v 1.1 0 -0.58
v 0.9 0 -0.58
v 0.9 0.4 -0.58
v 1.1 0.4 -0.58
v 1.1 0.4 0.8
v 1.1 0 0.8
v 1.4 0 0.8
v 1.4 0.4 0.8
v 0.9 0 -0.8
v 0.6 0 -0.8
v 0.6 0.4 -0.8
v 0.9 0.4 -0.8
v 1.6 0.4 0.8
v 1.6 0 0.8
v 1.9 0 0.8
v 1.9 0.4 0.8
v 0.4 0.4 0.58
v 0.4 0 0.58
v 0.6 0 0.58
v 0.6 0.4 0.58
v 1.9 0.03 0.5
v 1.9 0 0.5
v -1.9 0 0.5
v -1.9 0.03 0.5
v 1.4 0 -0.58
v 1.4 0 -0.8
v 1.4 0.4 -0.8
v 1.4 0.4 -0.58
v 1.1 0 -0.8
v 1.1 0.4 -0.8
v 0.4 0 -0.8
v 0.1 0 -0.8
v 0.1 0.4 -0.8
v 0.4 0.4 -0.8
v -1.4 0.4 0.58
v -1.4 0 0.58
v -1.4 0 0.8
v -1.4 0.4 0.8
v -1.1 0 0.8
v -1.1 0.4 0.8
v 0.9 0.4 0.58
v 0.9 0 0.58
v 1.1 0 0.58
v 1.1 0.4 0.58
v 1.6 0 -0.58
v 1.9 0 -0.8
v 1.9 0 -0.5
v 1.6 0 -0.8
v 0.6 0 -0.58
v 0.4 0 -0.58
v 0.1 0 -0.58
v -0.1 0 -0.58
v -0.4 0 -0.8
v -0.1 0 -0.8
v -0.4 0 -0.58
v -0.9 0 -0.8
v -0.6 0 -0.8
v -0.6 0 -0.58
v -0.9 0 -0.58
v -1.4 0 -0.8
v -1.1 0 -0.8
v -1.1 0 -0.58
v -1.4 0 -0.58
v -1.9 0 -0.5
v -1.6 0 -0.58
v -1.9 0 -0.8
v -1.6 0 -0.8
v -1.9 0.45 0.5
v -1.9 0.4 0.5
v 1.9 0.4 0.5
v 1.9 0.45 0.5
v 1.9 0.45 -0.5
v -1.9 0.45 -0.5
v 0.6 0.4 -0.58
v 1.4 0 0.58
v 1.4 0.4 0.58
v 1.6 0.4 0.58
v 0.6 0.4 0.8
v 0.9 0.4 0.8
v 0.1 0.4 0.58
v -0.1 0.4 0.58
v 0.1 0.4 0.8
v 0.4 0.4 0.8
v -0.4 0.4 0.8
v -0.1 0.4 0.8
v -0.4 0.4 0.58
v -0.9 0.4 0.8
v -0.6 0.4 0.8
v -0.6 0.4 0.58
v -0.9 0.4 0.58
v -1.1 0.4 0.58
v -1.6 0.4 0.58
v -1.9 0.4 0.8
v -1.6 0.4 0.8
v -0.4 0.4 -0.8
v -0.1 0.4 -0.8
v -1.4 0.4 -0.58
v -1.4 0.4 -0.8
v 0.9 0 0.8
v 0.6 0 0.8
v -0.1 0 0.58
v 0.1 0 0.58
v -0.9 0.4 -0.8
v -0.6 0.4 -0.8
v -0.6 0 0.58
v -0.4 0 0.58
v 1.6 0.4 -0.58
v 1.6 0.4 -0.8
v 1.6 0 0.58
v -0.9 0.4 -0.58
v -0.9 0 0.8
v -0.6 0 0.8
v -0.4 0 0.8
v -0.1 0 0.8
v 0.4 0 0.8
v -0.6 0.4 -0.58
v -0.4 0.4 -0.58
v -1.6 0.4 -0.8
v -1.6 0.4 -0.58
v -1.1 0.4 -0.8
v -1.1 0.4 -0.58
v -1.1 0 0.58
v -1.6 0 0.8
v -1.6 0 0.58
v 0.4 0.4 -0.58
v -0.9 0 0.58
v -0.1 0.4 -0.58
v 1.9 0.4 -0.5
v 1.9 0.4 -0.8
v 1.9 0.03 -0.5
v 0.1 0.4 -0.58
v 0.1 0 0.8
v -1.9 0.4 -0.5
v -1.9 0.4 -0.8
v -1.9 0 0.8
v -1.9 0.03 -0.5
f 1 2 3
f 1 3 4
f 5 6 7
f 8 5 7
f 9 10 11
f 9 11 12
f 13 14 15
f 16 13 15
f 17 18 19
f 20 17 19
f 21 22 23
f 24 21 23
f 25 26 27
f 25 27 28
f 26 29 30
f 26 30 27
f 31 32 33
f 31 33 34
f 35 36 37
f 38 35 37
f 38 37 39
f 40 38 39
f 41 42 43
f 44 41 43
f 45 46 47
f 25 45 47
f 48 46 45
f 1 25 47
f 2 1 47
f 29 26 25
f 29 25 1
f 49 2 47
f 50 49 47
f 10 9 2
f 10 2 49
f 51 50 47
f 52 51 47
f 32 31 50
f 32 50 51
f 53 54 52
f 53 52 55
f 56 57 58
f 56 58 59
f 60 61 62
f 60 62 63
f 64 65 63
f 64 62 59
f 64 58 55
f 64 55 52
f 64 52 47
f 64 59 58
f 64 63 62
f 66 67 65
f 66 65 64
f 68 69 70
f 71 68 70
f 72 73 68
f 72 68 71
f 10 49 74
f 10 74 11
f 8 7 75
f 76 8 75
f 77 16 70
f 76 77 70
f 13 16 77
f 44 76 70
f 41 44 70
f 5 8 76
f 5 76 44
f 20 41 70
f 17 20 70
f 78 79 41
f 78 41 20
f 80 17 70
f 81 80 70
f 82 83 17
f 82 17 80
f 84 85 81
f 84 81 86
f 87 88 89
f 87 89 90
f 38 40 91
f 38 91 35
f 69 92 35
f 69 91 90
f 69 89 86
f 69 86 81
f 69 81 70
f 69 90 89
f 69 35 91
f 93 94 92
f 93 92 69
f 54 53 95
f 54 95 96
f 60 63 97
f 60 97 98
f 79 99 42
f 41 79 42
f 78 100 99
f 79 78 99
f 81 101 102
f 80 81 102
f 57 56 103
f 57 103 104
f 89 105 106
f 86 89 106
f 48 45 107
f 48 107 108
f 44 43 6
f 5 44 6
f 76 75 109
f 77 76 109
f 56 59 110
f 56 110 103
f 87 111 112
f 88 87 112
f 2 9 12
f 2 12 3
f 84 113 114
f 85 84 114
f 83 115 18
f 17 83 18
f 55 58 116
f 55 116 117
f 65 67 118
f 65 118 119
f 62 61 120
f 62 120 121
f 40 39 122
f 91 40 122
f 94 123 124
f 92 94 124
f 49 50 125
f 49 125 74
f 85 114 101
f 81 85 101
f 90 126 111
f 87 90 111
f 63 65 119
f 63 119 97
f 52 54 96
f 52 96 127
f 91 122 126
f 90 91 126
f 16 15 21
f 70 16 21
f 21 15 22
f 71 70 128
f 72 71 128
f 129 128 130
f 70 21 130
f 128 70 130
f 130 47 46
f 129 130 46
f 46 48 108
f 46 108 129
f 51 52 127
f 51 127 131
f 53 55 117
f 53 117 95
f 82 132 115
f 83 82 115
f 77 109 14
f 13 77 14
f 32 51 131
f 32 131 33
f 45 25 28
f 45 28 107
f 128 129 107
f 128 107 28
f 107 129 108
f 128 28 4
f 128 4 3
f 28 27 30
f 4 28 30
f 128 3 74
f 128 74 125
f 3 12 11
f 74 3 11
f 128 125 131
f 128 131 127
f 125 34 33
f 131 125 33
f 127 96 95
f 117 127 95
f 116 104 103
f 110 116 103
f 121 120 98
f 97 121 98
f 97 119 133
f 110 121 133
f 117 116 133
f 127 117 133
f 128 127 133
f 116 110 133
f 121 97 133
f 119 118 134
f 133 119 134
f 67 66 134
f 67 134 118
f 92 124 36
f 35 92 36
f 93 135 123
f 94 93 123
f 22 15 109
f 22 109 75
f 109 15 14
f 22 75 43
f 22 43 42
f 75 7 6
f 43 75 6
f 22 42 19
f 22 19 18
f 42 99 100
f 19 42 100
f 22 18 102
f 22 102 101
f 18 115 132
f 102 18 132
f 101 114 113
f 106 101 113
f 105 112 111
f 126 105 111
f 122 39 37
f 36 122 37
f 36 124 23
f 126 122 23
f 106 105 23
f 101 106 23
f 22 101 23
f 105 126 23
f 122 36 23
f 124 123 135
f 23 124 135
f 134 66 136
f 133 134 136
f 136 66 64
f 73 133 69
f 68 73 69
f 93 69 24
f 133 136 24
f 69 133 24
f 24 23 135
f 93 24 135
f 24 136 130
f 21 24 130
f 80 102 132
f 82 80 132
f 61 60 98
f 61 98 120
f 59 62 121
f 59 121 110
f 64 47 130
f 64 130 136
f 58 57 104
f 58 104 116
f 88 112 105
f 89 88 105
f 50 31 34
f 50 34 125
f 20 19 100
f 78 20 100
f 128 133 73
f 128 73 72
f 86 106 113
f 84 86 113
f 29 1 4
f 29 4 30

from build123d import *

# Parameters (mm, degrees)
BOSS_EXTRUDE1_START = 0.03
SKETCH1_W           = 3.8
SKETCH1_H           = 1
BOSS_EXTRUDE1_DEPTH = 0.42
BOSS_EXTRUDE2_DEPTH = 0.4


with BuildPart() as part:
    # Sketch1 → Boss-Extrude1 (new body)
    with BuildSketch(Plane(origin=(0, 0, 0), x_dir=(1, 0, 0), z_dir=(0, 1, 0)).offset(BOSS_EXTRUDE1_START)):
        Rectangle(SKETCH1_W, SKETCH1_H)
    extrude(amount=BOSS_EXTRUDE1_DEPTH)

    # Sketch2 → Boss-Extrude2 (add)
    with BuildSketch(Plane(origin=(0, 0, 0), x_dir=(1, 0, 0), z_dir=(0, 1, 0))):
        Polygon((1.9, 0.5), (-1.9, 0.5), (-1.9, 0.8), (-1.6, 0.8), (-1.6, 0.58), (-1.4, 0.58), (-1.4, 0.8), (-1.1, 0.8), (-1.1, 0.58), (-0.9, 0.58), (-0.9, 0.8), (-0.6, 0.8), (-0.6, 0.58), (-0.4, 0.58), (-0.4, 0.8), (-0.1, 0.8), (-0.1, 0.58), (0.1, 0.58), (0.1, 0.8), (0.4, 0.8), (0.4, 0.58), (0.6, 0.58), (0.6, 0.8), (0.9, 0.8), (0.9, 0.58), (1.1, 0.58), (1.1, 0.8), (1.4, 0.8), (1.4, 0.58), (1.6, 0.58), (1.6, 0.8), (1.9, 0.8), align=None)
    boss_extrude2 = extrude(amount=BOSS_EXTRUDE2_DEPTH)

    # Mirror1: Boss-Extrude2 across plane
    add(boss_extrude2.mirror(Plane.XY))


solid = part.part
